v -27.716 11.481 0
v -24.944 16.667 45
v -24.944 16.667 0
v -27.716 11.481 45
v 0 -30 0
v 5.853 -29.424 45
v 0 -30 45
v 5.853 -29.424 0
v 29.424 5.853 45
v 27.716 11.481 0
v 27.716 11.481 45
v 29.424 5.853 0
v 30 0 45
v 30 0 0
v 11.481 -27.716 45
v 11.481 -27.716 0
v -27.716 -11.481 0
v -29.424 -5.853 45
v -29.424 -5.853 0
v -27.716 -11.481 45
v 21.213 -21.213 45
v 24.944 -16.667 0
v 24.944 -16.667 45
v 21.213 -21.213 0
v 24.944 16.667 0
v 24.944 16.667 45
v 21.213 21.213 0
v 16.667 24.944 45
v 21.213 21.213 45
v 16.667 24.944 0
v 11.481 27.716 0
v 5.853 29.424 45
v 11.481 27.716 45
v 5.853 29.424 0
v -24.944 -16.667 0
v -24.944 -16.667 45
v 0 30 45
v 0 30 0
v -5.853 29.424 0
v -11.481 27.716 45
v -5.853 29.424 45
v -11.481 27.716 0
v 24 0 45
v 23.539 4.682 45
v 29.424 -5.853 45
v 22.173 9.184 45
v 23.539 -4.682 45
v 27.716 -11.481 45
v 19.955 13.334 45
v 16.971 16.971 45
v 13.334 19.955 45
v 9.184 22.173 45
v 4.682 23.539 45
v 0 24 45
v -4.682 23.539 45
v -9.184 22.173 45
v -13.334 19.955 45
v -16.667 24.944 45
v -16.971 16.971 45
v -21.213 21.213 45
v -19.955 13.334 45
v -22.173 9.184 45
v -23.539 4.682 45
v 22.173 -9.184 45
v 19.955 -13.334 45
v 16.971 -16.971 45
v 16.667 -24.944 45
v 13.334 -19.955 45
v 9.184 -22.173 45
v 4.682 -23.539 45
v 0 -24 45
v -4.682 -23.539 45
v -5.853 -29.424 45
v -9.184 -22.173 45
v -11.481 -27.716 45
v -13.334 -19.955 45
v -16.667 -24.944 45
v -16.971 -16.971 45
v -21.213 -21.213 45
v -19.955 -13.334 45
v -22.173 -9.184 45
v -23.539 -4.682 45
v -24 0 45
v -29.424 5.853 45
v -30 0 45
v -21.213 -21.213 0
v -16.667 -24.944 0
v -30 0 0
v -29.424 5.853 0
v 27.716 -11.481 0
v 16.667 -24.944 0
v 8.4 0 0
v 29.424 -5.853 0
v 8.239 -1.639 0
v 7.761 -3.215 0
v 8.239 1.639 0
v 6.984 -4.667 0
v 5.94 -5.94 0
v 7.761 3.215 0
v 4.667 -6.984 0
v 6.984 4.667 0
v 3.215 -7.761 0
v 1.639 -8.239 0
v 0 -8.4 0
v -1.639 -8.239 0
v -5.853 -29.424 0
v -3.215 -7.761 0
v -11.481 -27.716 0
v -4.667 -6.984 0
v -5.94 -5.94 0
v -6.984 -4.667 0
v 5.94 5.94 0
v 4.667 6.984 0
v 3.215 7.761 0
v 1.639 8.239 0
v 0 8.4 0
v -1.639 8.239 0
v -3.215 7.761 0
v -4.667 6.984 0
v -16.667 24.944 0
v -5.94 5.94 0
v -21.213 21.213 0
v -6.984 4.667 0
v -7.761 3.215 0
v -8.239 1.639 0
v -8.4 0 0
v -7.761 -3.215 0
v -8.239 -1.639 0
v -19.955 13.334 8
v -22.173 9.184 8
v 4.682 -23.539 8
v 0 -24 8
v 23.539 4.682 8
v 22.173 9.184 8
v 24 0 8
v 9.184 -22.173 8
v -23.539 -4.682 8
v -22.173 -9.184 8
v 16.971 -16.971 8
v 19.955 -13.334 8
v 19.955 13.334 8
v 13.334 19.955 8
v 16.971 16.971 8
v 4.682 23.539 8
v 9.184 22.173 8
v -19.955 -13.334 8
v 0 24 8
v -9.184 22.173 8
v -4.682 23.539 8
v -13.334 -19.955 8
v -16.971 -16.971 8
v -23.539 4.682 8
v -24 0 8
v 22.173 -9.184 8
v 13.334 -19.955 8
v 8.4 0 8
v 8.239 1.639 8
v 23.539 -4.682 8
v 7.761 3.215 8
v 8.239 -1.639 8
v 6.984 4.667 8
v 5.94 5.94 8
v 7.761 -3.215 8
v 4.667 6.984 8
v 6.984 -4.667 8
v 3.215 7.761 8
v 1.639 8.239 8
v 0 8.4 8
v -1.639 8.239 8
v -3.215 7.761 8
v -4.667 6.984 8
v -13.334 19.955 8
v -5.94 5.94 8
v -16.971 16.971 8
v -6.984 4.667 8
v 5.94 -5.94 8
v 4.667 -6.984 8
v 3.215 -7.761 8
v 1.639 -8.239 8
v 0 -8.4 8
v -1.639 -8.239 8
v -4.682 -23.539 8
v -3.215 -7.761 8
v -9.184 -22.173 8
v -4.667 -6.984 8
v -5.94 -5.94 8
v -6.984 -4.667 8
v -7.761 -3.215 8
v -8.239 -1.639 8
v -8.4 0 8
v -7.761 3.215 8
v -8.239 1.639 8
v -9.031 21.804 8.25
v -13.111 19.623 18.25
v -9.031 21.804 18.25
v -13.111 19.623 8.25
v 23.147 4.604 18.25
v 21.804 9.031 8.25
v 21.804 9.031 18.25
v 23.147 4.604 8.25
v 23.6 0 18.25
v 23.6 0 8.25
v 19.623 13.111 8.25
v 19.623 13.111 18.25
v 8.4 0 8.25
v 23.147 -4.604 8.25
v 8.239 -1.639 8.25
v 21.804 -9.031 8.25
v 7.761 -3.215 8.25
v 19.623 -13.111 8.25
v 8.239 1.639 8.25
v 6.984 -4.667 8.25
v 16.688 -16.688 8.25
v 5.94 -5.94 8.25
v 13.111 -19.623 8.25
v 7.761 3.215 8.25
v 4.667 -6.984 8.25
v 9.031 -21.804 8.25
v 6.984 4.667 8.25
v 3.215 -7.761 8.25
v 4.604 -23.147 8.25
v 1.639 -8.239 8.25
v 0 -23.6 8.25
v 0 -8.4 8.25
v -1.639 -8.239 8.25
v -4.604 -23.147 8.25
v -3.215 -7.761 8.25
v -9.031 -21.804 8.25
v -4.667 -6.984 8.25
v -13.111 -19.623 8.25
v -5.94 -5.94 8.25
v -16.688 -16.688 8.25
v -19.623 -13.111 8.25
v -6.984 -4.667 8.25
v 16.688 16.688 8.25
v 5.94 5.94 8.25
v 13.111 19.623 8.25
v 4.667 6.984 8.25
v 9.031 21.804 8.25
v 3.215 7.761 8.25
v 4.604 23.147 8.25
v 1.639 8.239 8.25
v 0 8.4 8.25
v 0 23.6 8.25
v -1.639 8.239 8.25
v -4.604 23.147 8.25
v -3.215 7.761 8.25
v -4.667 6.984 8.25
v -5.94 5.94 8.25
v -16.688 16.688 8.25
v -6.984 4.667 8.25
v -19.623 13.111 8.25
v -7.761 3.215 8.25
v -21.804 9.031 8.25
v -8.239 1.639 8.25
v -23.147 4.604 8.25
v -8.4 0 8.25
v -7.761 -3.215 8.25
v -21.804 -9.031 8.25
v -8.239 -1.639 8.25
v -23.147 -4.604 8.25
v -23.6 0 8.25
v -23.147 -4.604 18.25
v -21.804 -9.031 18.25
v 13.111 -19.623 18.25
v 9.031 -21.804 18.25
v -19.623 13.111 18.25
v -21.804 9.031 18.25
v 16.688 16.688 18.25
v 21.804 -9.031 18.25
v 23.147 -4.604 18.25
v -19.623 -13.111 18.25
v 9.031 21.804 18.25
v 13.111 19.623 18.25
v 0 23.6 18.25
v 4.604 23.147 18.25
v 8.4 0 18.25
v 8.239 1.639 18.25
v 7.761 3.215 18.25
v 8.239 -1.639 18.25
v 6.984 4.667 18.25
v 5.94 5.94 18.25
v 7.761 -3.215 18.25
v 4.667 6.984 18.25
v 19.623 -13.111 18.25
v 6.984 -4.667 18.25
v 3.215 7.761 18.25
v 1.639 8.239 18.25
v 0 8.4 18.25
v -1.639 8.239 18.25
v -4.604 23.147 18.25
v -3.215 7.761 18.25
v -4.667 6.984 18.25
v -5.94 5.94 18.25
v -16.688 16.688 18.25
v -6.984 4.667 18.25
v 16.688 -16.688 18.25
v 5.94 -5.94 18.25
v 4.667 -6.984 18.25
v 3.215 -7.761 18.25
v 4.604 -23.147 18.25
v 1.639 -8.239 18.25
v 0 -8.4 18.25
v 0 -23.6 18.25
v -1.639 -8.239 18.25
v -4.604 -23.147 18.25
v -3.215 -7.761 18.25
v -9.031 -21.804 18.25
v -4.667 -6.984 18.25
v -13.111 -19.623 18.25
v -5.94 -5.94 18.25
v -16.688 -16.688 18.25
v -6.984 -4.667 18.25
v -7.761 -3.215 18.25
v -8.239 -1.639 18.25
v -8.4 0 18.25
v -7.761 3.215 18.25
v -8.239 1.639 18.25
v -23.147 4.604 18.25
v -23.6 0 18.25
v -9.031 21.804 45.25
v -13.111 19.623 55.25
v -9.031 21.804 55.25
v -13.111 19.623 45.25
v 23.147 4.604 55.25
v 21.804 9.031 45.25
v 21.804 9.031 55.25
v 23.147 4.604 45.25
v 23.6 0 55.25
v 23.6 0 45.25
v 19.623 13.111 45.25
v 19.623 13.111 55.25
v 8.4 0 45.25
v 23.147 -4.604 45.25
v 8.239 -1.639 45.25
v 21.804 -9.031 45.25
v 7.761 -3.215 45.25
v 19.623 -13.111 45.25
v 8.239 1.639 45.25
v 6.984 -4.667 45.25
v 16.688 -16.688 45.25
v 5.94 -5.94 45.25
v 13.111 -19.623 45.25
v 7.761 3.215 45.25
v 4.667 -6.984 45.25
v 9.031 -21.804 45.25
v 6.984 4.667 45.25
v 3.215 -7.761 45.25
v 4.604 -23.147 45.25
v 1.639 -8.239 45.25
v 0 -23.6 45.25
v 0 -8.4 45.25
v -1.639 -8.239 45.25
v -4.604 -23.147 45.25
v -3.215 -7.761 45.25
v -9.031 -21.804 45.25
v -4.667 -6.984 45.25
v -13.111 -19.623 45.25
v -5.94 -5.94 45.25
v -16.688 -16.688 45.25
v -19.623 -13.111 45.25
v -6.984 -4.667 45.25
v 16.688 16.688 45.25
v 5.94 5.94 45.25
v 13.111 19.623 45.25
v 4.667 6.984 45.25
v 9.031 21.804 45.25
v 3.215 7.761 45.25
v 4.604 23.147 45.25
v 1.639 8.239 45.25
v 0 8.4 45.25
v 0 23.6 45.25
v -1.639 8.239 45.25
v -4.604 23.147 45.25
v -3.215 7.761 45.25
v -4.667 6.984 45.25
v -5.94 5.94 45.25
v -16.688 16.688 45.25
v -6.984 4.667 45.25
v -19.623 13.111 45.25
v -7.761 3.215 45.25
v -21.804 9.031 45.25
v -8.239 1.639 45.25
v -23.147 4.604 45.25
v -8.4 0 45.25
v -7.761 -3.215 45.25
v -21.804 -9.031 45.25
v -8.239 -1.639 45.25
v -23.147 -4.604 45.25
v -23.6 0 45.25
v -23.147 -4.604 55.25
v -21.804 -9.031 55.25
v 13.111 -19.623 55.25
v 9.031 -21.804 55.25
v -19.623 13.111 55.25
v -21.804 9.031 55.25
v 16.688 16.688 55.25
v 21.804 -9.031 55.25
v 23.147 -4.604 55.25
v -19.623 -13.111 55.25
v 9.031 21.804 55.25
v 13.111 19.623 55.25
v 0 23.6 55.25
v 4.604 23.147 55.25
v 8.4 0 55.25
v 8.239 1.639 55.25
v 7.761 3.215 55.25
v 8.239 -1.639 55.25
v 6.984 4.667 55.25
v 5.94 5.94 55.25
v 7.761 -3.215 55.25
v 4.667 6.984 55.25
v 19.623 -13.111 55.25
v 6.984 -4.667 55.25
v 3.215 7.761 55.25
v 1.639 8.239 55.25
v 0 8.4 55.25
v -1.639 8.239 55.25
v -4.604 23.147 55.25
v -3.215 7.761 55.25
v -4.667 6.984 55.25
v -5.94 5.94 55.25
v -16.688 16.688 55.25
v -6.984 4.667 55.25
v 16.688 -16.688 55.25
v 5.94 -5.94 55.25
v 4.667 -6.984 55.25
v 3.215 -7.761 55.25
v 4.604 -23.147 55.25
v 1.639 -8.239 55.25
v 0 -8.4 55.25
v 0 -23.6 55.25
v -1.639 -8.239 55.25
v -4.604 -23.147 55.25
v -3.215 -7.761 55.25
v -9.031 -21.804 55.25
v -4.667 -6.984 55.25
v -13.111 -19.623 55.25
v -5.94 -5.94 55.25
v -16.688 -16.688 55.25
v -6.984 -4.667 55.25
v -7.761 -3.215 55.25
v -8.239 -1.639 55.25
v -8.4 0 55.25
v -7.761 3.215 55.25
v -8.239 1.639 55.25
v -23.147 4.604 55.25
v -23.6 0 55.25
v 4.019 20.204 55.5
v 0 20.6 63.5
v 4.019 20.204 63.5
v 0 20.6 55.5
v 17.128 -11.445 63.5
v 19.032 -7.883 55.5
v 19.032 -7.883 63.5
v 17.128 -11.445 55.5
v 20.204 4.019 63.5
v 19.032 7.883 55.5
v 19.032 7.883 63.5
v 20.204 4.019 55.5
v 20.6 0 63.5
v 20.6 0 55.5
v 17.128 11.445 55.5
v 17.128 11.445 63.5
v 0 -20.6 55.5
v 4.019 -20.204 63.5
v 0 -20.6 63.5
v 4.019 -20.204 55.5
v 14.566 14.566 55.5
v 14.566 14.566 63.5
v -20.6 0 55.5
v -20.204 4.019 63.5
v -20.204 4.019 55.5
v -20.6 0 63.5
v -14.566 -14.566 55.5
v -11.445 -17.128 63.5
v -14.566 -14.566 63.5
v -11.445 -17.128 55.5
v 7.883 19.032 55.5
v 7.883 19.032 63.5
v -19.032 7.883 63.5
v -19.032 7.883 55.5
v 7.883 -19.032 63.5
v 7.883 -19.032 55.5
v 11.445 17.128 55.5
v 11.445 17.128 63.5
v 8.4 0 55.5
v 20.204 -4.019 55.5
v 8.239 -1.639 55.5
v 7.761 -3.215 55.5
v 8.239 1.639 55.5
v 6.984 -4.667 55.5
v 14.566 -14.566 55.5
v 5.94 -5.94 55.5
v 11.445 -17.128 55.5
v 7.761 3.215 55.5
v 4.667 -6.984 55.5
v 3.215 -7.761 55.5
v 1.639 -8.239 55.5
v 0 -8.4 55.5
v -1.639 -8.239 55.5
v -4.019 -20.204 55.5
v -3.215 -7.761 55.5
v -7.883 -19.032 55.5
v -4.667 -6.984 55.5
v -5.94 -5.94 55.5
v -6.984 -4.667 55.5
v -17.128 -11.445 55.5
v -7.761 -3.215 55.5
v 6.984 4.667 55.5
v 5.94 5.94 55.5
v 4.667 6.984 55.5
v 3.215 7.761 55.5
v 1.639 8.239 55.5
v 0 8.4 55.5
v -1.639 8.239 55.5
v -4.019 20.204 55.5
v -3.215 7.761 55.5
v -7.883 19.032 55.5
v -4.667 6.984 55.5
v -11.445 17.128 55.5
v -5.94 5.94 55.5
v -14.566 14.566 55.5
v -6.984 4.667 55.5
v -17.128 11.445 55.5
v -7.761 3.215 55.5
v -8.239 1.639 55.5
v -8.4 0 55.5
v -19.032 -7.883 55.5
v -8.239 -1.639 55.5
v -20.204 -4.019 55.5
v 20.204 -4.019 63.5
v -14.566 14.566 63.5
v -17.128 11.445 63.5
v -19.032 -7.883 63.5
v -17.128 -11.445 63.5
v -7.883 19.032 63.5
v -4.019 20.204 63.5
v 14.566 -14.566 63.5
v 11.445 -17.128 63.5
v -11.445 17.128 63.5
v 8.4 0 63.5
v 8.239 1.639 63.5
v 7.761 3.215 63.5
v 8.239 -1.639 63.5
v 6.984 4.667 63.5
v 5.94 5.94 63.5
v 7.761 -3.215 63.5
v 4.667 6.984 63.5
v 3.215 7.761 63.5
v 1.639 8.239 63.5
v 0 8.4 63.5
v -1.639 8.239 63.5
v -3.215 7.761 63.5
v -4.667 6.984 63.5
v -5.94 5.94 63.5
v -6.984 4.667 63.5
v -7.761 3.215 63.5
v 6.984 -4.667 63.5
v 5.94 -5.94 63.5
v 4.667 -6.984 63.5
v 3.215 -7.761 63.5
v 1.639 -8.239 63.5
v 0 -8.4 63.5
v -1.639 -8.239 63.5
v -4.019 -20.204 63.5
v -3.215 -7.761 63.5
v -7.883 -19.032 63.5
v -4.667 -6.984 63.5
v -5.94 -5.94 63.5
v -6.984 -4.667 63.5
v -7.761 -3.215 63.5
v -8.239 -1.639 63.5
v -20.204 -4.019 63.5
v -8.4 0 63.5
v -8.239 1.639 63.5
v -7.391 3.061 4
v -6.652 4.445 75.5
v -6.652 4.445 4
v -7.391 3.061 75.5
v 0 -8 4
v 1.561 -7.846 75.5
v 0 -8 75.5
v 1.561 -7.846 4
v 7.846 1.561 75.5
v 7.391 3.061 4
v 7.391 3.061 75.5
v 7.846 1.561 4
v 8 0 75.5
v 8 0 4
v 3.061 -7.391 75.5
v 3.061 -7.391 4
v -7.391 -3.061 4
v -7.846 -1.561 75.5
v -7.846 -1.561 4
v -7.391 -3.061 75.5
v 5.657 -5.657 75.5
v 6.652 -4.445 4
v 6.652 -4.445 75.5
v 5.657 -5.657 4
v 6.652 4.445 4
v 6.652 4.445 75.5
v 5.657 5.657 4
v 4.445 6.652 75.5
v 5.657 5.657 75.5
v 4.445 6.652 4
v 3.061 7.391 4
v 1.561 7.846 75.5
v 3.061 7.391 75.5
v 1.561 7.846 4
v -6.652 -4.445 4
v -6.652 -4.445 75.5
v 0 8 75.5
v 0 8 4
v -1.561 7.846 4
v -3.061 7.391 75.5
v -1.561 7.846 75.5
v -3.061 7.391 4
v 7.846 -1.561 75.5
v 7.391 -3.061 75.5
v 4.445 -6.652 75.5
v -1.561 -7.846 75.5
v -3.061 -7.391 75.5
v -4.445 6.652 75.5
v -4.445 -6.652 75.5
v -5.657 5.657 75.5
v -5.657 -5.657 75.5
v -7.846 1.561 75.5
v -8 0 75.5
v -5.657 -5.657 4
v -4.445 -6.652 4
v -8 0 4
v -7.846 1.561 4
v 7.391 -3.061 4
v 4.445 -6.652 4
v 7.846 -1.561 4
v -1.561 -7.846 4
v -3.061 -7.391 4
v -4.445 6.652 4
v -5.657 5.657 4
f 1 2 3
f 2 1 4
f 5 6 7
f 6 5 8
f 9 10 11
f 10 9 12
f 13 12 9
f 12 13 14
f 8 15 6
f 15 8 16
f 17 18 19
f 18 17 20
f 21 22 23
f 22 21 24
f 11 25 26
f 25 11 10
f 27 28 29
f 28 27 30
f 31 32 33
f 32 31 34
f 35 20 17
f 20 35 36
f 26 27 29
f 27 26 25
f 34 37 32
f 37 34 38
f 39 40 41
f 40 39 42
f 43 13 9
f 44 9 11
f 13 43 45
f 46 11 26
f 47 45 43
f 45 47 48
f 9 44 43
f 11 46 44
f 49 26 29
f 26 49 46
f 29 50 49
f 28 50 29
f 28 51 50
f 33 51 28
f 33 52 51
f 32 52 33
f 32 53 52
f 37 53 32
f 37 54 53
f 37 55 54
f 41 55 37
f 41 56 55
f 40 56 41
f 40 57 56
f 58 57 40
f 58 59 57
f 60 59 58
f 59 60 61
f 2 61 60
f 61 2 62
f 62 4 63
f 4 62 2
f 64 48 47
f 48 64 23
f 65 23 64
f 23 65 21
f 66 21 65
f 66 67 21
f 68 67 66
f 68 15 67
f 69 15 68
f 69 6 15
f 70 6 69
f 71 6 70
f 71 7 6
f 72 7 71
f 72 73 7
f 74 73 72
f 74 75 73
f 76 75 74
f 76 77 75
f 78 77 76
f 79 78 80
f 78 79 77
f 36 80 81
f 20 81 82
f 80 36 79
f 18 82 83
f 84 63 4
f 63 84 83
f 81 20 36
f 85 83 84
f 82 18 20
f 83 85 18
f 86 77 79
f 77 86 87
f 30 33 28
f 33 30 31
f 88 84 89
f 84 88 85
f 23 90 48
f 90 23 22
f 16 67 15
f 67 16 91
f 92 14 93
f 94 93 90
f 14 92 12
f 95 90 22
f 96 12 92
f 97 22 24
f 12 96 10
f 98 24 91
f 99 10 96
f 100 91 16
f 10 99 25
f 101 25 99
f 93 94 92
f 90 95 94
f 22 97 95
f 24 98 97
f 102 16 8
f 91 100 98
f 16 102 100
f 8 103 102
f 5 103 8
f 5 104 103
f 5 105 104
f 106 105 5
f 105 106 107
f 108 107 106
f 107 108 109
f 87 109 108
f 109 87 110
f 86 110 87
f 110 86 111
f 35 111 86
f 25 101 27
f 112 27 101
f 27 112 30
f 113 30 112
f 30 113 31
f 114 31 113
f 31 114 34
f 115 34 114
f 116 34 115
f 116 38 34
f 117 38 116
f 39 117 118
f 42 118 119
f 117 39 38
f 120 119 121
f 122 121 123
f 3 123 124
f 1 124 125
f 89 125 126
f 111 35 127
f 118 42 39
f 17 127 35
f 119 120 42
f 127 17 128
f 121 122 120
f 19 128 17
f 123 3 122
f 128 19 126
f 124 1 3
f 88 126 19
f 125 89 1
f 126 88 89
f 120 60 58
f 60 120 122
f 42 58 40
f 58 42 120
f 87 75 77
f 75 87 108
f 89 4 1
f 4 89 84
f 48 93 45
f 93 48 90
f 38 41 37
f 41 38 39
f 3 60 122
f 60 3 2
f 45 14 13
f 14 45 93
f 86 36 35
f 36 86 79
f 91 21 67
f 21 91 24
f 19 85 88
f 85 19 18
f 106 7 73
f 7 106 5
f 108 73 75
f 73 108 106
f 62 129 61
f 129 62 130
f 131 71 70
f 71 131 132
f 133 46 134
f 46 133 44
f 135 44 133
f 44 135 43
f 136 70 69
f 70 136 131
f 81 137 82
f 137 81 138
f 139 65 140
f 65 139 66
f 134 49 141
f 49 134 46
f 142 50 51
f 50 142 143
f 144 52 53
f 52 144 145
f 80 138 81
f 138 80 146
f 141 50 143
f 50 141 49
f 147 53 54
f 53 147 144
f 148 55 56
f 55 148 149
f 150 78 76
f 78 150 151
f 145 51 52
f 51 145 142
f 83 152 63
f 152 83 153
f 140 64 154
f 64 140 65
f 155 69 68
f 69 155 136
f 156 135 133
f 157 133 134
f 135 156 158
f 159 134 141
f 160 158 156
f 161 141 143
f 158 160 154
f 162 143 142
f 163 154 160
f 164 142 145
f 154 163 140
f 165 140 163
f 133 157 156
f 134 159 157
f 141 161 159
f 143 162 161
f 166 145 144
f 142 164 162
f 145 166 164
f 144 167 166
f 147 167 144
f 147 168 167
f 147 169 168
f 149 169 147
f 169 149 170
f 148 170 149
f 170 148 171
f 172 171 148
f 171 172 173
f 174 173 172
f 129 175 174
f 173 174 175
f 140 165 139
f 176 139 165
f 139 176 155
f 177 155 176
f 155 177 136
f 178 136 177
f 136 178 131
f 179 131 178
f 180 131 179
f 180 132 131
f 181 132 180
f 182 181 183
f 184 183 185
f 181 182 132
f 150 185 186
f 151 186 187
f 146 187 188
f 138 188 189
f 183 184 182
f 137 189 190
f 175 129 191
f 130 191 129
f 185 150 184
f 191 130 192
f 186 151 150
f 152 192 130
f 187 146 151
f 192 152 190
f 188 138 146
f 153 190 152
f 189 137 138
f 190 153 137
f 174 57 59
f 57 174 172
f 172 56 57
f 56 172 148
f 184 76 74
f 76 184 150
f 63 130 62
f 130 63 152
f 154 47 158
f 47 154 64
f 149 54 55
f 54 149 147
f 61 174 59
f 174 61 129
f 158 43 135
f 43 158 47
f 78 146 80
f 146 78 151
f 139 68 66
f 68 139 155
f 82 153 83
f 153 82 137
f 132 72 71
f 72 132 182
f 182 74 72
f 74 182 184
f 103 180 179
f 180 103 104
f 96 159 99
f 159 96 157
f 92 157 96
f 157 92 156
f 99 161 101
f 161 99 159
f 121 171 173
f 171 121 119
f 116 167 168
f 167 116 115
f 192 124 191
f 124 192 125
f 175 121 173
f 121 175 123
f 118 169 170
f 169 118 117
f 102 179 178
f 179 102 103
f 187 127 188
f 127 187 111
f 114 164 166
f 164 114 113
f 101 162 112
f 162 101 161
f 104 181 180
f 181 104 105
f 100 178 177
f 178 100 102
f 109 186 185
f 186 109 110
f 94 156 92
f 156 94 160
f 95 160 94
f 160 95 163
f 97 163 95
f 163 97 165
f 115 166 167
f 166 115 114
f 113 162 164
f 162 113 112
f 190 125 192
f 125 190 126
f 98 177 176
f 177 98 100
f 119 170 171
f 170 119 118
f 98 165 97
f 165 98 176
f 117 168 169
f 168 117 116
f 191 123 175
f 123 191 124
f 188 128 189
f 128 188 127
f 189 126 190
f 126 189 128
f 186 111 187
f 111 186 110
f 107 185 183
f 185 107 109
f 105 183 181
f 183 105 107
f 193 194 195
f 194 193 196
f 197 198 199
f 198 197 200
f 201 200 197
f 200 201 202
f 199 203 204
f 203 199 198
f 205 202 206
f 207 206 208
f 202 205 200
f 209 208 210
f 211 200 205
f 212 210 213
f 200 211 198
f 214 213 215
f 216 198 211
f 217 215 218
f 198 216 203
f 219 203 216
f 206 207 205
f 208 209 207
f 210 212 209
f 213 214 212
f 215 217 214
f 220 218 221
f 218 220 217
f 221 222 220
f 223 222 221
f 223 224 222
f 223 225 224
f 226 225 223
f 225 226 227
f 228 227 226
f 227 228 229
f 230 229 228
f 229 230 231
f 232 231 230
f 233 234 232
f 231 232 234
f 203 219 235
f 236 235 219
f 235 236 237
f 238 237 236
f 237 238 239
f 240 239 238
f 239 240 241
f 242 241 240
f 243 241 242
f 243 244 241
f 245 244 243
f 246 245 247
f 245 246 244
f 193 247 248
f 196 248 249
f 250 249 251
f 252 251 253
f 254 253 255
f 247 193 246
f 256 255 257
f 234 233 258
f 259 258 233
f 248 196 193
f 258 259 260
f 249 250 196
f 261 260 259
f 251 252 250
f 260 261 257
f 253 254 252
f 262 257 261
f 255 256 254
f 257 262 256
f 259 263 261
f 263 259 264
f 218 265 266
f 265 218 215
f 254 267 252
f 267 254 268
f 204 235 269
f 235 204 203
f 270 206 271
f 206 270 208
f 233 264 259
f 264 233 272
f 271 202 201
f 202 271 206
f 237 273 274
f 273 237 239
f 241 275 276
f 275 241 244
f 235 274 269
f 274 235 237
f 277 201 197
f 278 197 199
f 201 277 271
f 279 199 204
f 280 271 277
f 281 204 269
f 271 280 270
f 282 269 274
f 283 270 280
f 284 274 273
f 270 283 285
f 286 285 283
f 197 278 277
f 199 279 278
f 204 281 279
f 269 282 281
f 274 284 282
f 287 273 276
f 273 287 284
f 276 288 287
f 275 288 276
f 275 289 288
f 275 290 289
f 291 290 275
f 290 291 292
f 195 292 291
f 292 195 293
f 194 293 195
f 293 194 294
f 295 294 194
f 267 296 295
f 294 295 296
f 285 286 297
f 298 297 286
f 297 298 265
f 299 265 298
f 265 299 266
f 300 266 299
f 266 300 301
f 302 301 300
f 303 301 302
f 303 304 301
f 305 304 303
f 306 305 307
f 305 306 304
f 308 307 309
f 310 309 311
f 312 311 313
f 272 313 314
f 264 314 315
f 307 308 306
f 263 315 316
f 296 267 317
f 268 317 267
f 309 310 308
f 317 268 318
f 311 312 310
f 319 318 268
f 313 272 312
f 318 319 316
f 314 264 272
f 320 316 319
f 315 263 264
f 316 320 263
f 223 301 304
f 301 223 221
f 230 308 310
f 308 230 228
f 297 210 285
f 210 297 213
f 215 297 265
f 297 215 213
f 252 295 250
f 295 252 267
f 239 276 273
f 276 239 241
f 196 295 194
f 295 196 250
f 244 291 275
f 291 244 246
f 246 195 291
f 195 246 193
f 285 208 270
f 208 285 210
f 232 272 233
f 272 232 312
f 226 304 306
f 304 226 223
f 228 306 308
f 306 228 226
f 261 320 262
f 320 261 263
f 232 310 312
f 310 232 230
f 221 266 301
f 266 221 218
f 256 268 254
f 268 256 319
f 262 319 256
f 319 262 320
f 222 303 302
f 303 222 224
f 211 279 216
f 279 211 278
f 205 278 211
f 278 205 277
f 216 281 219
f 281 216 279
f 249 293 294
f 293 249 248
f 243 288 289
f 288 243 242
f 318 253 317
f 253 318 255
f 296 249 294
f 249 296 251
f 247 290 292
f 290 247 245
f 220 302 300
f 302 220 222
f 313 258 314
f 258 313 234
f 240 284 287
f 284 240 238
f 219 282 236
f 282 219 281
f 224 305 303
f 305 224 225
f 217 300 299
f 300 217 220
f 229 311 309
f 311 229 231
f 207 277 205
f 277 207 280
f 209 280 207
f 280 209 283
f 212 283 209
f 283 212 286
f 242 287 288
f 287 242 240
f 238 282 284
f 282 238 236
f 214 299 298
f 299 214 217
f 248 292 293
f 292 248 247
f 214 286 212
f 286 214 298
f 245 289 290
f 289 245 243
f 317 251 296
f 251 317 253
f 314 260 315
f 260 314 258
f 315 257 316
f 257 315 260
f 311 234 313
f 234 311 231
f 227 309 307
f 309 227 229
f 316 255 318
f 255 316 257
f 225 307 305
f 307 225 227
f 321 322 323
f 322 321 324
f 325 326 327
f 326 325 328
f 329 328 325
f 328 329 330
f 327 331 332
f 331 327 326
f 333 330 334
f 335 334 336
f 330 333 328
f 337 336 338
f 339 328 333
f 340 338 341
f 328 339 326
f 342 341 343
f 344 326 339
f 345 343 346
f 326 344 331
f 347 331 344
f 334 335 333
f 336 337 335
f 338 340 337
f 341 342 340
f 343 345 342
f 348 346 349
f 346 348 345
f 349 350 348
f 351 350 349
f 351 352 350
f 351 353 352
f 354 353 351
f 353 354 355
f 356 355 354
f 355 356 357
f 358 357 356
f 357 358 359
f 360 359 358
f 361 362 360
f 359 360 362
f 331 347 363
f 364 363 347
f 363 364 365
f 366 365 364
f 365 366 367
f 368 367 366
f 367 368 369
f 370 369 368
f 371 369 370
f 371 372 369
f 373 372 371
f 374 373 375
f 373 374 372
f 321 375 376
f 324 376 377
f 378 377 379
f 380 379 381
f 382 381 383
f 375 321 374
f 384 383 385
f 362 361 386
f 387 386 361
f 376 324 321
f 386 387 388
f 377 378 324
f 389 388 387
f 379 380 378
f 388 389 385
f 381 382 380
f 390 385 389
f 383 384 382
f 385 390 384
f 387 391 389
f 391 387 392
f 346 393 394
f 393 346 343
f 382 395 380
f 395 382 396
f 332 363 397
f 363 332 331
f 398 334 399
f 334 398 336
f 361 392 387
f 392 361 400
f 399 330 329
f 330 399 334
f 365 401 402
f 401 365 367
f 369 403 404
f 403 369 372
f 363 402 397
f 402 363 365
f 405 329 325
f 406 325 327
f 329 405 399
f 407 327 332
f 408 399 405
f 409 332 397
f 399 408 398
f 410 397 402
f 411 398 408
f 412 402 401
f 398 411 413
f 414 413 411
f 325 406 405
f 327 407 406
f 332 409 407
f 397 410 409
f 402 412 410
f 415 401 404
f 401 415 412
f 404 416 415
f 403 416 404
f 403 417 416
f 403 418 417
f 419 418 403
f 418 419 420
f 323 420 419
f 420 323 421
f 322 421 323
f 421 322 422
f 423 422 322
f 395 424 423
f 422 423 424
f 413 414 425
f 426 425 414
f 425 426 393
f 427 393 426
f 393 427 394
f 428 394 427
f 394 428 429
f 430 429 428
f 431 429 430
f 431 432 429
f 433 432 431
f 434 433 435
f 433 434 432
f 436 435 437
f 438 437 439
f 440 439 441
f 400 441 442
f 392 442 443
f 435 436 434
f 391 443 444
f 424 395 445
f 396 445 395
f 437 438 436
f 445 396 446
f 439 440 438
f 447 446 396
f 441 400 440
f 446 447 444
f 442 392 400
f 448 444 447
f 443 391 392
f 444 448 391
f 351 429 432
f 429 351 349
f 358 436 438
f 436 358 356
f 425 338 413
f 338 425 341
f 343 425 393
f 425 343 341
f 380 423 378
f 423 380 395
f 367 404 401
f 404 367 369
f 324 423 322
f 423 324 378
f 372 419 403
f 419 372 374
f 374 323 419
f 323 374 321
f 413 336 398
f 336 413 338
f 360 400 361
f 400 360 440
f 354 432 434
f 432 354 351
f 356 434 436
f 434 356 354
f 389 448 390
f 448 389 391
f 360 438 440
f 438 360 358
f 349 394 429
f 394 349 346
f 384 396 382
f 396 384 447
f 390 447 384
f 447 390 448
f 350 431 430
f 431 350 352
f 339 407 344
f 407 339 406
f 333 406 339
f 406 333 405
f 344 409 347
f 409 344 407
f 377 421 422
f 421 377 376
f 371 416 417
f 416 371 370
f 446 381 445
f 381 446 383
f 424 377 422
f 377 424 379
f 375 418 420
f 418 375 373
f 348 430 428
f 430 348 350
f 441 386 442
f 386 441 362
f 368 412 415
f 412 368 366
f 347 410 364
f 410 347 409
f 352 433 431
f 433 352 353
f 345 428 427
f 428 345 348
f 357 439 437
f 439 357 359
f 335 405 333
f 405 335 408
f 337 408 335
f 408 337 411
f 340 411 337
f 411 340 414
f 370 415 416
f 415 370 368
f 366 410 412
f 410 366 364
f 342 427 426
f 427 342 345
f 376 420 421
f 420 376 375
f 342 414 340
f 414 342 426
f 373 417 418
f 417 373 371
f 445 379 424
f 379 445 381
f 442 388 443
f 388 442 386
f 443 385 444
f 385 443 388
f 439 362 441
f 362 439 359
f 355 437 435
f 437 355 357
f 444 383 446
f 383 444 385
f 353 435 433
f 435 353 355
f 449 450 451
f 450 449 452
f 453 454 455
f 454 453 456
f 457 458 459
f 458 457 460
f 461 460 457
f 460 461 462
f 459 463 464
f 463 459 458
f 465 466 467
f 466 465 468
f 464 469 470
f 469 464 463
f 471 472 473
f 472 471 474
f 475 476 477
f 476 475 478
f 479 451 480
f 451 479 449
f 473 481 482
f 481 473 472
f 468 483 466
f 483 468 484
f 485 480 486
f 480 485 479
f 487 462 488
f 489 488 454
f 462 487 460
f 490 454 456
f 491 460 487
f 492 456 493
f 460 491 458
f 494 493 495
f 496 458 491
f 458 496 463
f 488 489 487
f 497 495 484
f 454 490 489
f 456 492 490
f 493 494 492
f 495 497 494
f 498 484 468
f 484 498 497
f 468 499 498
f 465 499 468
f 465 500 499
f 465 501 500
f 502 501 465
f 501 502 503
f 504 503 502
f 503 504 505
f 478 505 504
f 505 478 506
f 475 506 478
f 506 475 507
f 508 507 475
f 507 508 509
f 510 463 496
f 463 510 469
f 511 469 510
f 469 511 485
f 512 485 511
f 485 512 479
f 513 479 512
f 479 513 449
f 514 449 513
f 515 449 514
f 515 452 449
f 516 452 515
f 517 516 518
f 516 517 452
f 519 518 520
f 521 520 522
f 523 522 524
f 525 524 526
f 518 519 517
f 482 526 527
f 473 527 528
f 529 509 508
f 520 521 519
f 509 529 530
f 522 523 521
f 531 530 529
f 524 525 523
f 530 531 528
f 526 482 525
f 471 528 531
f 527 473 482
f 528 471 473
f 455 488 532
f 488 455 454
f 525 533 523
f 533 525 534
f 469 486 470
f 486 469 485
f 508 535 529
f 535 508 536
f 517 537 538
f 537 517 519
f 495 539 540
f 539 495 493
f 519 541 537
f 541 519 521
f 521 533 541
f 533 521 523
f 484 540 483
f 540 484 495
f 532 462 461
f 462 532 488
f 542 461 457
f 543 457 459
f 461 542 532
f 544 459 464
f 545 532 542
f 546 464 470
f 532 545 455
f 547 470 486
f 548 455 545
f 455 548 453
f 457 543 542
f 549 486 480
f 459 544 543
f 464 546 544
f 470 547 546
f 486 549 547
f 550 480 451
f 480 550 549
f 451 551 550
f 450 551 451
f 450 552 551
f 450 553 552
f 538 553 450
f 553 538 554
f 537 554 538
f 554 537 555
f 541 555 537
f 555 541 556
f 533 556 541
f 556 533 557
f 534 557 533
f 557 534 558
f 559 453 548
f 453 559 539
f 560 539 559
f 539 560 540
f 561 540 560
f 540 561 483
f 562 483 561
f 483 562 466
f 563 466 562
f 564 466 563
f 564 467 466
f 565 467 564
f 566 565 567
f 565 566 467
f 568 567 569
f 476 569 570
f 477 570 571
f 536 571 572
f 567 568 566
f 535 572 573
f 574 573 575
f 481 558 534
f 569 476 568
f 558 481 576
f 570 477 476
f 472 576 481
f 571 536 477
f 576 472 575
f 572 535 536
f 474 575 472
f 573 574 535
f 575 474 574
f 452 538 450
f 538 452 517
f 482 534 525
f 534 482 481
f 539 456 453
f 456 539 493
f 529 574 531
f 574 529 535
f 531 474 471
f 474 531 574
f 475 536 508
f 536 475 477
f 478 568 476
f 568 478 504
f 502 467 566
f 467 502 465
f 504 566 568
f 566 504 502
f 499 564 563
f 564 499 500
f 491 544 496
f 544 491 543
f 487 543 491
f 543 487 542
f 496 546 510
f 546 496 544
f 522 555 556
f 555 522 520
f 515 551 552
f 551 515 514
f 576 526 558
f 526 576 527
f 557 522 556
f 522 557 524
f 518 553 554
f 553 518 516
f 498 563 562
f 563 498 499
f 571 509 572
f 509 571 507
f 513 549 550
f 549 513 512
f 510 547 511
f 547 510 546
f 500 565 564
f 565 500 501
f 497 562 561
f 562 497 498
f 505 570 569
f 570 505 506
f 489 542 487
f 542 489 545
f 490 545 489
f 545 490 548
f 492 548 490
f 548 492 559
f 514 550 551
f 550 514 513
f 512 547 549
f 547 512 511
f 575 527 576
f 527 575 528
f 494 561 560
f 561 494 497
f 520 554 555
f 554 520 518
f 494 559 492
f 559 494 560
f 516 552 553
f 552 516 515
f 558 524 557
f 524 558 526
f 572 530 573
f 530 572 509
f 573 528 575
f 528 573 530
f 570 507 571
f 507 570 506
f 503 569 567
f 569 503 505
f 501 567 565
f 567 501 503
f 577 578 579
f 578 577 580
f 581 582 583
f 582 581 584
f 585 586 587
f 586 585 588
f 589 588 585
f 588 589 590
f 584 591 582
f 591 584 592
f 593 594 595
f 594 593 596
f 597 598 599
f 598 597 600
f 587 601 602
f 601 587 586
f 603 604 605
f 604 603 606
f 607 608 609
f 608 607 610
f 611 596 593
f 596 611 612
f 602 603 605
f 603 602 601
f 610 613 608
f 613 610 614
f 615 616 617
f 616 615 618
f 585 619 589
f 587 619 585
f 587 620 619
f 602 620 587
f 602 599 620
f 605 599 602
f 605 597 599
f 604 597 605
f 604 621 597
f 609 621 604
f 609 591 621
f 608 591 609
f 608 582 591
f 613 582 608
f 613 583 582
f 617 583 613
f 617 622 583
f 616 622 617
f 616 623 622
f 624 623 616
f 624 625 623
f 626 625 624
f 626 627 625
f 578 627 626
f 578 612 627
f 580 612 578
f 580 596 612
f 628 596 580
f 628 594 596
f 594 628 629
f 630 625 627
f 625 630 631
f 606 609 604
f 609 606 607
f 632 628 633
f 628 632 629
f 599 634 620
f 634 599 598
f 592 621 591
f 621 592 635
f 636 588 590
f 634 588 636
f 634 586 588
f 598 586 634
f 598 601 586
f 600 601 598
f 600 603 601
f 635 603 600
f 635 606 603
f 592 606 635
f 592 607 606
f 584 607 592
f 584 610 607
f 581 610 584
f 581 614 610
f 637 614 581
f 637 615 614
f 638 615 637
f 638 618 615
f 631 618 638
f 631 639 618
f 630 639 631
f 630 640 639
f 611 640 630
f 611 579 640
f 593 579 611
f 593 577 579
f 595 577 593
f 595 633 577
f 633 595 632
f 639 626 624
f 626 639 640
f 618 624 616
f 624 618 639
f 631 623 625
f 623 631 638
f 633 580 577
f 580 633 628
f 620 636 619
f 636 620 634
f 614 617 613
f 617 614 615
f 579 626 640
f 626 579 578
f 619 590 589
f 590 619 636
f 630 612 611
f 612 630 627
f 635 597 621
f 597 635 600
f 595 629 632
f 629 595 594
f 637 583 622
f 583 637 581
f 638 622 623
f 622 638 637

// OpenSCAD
$fn = 32;

// ------------------------------------------------------------------------
// Bearing housing: housing d60, two bearings and a shaft
// Every part is its own module, assembly() places them once.
// ------------------------------------------------------------------------

// --- part 1 ---
module housing() {
  difference() {
    cylinder(h = 45, d = 60);
    translate([0, 0, 8]) cylinder(h = 38, d = 48);
    translate([0, 0, -1]) cylinder(h = 10, d = 16.8);
  }
}

// --- part 2 ---
module bearing_lower() {
  difference() {
      translate([0, 0, 0]) cylinder(h = 10, d = 47.2);
      translate([0, 0, -1]) cylinder(h = 12, d = 16.8);
    }
}

// --- part 3 ---
module bearing_upper() {
  difference() {
      translate([0, 0, 0]) cylinder(h = 10, d = 47.2);
      translate([0, 0, -1]) cylinder(h = 12, d = 16.8);
    }
}

// --- part 4 ---
module spacer() {
  difference() {
      translate([0, 0, 0]) cylinder(h = 8, d = 41.2);
      translate([0, 0, -1]) cylinder(h = 10, d = 16.8);
    }
}

// --- part 5 ---
module shaft() {
  translate([0, 0, -35.75]) cylinder(h = 71.5, d = 16);
}

// --- assembly ---
module assembly() {
  translate([0, 0, 0]) rotate([0, 0, 0]) housing();
  translate([0, 0, 8.25]) rotate([0, 0, 0]) bearing_lower();
  translate([0, 0, 45.25]) rotate([0, 0, 0]) bearing_upper();
  translate([0, 0, 55.5]) rotate([0, 0, 0]) spacer();
  translate([0, 0, 39.75]) rotate([0, 0, 0]) shaft();
}

assembly();
